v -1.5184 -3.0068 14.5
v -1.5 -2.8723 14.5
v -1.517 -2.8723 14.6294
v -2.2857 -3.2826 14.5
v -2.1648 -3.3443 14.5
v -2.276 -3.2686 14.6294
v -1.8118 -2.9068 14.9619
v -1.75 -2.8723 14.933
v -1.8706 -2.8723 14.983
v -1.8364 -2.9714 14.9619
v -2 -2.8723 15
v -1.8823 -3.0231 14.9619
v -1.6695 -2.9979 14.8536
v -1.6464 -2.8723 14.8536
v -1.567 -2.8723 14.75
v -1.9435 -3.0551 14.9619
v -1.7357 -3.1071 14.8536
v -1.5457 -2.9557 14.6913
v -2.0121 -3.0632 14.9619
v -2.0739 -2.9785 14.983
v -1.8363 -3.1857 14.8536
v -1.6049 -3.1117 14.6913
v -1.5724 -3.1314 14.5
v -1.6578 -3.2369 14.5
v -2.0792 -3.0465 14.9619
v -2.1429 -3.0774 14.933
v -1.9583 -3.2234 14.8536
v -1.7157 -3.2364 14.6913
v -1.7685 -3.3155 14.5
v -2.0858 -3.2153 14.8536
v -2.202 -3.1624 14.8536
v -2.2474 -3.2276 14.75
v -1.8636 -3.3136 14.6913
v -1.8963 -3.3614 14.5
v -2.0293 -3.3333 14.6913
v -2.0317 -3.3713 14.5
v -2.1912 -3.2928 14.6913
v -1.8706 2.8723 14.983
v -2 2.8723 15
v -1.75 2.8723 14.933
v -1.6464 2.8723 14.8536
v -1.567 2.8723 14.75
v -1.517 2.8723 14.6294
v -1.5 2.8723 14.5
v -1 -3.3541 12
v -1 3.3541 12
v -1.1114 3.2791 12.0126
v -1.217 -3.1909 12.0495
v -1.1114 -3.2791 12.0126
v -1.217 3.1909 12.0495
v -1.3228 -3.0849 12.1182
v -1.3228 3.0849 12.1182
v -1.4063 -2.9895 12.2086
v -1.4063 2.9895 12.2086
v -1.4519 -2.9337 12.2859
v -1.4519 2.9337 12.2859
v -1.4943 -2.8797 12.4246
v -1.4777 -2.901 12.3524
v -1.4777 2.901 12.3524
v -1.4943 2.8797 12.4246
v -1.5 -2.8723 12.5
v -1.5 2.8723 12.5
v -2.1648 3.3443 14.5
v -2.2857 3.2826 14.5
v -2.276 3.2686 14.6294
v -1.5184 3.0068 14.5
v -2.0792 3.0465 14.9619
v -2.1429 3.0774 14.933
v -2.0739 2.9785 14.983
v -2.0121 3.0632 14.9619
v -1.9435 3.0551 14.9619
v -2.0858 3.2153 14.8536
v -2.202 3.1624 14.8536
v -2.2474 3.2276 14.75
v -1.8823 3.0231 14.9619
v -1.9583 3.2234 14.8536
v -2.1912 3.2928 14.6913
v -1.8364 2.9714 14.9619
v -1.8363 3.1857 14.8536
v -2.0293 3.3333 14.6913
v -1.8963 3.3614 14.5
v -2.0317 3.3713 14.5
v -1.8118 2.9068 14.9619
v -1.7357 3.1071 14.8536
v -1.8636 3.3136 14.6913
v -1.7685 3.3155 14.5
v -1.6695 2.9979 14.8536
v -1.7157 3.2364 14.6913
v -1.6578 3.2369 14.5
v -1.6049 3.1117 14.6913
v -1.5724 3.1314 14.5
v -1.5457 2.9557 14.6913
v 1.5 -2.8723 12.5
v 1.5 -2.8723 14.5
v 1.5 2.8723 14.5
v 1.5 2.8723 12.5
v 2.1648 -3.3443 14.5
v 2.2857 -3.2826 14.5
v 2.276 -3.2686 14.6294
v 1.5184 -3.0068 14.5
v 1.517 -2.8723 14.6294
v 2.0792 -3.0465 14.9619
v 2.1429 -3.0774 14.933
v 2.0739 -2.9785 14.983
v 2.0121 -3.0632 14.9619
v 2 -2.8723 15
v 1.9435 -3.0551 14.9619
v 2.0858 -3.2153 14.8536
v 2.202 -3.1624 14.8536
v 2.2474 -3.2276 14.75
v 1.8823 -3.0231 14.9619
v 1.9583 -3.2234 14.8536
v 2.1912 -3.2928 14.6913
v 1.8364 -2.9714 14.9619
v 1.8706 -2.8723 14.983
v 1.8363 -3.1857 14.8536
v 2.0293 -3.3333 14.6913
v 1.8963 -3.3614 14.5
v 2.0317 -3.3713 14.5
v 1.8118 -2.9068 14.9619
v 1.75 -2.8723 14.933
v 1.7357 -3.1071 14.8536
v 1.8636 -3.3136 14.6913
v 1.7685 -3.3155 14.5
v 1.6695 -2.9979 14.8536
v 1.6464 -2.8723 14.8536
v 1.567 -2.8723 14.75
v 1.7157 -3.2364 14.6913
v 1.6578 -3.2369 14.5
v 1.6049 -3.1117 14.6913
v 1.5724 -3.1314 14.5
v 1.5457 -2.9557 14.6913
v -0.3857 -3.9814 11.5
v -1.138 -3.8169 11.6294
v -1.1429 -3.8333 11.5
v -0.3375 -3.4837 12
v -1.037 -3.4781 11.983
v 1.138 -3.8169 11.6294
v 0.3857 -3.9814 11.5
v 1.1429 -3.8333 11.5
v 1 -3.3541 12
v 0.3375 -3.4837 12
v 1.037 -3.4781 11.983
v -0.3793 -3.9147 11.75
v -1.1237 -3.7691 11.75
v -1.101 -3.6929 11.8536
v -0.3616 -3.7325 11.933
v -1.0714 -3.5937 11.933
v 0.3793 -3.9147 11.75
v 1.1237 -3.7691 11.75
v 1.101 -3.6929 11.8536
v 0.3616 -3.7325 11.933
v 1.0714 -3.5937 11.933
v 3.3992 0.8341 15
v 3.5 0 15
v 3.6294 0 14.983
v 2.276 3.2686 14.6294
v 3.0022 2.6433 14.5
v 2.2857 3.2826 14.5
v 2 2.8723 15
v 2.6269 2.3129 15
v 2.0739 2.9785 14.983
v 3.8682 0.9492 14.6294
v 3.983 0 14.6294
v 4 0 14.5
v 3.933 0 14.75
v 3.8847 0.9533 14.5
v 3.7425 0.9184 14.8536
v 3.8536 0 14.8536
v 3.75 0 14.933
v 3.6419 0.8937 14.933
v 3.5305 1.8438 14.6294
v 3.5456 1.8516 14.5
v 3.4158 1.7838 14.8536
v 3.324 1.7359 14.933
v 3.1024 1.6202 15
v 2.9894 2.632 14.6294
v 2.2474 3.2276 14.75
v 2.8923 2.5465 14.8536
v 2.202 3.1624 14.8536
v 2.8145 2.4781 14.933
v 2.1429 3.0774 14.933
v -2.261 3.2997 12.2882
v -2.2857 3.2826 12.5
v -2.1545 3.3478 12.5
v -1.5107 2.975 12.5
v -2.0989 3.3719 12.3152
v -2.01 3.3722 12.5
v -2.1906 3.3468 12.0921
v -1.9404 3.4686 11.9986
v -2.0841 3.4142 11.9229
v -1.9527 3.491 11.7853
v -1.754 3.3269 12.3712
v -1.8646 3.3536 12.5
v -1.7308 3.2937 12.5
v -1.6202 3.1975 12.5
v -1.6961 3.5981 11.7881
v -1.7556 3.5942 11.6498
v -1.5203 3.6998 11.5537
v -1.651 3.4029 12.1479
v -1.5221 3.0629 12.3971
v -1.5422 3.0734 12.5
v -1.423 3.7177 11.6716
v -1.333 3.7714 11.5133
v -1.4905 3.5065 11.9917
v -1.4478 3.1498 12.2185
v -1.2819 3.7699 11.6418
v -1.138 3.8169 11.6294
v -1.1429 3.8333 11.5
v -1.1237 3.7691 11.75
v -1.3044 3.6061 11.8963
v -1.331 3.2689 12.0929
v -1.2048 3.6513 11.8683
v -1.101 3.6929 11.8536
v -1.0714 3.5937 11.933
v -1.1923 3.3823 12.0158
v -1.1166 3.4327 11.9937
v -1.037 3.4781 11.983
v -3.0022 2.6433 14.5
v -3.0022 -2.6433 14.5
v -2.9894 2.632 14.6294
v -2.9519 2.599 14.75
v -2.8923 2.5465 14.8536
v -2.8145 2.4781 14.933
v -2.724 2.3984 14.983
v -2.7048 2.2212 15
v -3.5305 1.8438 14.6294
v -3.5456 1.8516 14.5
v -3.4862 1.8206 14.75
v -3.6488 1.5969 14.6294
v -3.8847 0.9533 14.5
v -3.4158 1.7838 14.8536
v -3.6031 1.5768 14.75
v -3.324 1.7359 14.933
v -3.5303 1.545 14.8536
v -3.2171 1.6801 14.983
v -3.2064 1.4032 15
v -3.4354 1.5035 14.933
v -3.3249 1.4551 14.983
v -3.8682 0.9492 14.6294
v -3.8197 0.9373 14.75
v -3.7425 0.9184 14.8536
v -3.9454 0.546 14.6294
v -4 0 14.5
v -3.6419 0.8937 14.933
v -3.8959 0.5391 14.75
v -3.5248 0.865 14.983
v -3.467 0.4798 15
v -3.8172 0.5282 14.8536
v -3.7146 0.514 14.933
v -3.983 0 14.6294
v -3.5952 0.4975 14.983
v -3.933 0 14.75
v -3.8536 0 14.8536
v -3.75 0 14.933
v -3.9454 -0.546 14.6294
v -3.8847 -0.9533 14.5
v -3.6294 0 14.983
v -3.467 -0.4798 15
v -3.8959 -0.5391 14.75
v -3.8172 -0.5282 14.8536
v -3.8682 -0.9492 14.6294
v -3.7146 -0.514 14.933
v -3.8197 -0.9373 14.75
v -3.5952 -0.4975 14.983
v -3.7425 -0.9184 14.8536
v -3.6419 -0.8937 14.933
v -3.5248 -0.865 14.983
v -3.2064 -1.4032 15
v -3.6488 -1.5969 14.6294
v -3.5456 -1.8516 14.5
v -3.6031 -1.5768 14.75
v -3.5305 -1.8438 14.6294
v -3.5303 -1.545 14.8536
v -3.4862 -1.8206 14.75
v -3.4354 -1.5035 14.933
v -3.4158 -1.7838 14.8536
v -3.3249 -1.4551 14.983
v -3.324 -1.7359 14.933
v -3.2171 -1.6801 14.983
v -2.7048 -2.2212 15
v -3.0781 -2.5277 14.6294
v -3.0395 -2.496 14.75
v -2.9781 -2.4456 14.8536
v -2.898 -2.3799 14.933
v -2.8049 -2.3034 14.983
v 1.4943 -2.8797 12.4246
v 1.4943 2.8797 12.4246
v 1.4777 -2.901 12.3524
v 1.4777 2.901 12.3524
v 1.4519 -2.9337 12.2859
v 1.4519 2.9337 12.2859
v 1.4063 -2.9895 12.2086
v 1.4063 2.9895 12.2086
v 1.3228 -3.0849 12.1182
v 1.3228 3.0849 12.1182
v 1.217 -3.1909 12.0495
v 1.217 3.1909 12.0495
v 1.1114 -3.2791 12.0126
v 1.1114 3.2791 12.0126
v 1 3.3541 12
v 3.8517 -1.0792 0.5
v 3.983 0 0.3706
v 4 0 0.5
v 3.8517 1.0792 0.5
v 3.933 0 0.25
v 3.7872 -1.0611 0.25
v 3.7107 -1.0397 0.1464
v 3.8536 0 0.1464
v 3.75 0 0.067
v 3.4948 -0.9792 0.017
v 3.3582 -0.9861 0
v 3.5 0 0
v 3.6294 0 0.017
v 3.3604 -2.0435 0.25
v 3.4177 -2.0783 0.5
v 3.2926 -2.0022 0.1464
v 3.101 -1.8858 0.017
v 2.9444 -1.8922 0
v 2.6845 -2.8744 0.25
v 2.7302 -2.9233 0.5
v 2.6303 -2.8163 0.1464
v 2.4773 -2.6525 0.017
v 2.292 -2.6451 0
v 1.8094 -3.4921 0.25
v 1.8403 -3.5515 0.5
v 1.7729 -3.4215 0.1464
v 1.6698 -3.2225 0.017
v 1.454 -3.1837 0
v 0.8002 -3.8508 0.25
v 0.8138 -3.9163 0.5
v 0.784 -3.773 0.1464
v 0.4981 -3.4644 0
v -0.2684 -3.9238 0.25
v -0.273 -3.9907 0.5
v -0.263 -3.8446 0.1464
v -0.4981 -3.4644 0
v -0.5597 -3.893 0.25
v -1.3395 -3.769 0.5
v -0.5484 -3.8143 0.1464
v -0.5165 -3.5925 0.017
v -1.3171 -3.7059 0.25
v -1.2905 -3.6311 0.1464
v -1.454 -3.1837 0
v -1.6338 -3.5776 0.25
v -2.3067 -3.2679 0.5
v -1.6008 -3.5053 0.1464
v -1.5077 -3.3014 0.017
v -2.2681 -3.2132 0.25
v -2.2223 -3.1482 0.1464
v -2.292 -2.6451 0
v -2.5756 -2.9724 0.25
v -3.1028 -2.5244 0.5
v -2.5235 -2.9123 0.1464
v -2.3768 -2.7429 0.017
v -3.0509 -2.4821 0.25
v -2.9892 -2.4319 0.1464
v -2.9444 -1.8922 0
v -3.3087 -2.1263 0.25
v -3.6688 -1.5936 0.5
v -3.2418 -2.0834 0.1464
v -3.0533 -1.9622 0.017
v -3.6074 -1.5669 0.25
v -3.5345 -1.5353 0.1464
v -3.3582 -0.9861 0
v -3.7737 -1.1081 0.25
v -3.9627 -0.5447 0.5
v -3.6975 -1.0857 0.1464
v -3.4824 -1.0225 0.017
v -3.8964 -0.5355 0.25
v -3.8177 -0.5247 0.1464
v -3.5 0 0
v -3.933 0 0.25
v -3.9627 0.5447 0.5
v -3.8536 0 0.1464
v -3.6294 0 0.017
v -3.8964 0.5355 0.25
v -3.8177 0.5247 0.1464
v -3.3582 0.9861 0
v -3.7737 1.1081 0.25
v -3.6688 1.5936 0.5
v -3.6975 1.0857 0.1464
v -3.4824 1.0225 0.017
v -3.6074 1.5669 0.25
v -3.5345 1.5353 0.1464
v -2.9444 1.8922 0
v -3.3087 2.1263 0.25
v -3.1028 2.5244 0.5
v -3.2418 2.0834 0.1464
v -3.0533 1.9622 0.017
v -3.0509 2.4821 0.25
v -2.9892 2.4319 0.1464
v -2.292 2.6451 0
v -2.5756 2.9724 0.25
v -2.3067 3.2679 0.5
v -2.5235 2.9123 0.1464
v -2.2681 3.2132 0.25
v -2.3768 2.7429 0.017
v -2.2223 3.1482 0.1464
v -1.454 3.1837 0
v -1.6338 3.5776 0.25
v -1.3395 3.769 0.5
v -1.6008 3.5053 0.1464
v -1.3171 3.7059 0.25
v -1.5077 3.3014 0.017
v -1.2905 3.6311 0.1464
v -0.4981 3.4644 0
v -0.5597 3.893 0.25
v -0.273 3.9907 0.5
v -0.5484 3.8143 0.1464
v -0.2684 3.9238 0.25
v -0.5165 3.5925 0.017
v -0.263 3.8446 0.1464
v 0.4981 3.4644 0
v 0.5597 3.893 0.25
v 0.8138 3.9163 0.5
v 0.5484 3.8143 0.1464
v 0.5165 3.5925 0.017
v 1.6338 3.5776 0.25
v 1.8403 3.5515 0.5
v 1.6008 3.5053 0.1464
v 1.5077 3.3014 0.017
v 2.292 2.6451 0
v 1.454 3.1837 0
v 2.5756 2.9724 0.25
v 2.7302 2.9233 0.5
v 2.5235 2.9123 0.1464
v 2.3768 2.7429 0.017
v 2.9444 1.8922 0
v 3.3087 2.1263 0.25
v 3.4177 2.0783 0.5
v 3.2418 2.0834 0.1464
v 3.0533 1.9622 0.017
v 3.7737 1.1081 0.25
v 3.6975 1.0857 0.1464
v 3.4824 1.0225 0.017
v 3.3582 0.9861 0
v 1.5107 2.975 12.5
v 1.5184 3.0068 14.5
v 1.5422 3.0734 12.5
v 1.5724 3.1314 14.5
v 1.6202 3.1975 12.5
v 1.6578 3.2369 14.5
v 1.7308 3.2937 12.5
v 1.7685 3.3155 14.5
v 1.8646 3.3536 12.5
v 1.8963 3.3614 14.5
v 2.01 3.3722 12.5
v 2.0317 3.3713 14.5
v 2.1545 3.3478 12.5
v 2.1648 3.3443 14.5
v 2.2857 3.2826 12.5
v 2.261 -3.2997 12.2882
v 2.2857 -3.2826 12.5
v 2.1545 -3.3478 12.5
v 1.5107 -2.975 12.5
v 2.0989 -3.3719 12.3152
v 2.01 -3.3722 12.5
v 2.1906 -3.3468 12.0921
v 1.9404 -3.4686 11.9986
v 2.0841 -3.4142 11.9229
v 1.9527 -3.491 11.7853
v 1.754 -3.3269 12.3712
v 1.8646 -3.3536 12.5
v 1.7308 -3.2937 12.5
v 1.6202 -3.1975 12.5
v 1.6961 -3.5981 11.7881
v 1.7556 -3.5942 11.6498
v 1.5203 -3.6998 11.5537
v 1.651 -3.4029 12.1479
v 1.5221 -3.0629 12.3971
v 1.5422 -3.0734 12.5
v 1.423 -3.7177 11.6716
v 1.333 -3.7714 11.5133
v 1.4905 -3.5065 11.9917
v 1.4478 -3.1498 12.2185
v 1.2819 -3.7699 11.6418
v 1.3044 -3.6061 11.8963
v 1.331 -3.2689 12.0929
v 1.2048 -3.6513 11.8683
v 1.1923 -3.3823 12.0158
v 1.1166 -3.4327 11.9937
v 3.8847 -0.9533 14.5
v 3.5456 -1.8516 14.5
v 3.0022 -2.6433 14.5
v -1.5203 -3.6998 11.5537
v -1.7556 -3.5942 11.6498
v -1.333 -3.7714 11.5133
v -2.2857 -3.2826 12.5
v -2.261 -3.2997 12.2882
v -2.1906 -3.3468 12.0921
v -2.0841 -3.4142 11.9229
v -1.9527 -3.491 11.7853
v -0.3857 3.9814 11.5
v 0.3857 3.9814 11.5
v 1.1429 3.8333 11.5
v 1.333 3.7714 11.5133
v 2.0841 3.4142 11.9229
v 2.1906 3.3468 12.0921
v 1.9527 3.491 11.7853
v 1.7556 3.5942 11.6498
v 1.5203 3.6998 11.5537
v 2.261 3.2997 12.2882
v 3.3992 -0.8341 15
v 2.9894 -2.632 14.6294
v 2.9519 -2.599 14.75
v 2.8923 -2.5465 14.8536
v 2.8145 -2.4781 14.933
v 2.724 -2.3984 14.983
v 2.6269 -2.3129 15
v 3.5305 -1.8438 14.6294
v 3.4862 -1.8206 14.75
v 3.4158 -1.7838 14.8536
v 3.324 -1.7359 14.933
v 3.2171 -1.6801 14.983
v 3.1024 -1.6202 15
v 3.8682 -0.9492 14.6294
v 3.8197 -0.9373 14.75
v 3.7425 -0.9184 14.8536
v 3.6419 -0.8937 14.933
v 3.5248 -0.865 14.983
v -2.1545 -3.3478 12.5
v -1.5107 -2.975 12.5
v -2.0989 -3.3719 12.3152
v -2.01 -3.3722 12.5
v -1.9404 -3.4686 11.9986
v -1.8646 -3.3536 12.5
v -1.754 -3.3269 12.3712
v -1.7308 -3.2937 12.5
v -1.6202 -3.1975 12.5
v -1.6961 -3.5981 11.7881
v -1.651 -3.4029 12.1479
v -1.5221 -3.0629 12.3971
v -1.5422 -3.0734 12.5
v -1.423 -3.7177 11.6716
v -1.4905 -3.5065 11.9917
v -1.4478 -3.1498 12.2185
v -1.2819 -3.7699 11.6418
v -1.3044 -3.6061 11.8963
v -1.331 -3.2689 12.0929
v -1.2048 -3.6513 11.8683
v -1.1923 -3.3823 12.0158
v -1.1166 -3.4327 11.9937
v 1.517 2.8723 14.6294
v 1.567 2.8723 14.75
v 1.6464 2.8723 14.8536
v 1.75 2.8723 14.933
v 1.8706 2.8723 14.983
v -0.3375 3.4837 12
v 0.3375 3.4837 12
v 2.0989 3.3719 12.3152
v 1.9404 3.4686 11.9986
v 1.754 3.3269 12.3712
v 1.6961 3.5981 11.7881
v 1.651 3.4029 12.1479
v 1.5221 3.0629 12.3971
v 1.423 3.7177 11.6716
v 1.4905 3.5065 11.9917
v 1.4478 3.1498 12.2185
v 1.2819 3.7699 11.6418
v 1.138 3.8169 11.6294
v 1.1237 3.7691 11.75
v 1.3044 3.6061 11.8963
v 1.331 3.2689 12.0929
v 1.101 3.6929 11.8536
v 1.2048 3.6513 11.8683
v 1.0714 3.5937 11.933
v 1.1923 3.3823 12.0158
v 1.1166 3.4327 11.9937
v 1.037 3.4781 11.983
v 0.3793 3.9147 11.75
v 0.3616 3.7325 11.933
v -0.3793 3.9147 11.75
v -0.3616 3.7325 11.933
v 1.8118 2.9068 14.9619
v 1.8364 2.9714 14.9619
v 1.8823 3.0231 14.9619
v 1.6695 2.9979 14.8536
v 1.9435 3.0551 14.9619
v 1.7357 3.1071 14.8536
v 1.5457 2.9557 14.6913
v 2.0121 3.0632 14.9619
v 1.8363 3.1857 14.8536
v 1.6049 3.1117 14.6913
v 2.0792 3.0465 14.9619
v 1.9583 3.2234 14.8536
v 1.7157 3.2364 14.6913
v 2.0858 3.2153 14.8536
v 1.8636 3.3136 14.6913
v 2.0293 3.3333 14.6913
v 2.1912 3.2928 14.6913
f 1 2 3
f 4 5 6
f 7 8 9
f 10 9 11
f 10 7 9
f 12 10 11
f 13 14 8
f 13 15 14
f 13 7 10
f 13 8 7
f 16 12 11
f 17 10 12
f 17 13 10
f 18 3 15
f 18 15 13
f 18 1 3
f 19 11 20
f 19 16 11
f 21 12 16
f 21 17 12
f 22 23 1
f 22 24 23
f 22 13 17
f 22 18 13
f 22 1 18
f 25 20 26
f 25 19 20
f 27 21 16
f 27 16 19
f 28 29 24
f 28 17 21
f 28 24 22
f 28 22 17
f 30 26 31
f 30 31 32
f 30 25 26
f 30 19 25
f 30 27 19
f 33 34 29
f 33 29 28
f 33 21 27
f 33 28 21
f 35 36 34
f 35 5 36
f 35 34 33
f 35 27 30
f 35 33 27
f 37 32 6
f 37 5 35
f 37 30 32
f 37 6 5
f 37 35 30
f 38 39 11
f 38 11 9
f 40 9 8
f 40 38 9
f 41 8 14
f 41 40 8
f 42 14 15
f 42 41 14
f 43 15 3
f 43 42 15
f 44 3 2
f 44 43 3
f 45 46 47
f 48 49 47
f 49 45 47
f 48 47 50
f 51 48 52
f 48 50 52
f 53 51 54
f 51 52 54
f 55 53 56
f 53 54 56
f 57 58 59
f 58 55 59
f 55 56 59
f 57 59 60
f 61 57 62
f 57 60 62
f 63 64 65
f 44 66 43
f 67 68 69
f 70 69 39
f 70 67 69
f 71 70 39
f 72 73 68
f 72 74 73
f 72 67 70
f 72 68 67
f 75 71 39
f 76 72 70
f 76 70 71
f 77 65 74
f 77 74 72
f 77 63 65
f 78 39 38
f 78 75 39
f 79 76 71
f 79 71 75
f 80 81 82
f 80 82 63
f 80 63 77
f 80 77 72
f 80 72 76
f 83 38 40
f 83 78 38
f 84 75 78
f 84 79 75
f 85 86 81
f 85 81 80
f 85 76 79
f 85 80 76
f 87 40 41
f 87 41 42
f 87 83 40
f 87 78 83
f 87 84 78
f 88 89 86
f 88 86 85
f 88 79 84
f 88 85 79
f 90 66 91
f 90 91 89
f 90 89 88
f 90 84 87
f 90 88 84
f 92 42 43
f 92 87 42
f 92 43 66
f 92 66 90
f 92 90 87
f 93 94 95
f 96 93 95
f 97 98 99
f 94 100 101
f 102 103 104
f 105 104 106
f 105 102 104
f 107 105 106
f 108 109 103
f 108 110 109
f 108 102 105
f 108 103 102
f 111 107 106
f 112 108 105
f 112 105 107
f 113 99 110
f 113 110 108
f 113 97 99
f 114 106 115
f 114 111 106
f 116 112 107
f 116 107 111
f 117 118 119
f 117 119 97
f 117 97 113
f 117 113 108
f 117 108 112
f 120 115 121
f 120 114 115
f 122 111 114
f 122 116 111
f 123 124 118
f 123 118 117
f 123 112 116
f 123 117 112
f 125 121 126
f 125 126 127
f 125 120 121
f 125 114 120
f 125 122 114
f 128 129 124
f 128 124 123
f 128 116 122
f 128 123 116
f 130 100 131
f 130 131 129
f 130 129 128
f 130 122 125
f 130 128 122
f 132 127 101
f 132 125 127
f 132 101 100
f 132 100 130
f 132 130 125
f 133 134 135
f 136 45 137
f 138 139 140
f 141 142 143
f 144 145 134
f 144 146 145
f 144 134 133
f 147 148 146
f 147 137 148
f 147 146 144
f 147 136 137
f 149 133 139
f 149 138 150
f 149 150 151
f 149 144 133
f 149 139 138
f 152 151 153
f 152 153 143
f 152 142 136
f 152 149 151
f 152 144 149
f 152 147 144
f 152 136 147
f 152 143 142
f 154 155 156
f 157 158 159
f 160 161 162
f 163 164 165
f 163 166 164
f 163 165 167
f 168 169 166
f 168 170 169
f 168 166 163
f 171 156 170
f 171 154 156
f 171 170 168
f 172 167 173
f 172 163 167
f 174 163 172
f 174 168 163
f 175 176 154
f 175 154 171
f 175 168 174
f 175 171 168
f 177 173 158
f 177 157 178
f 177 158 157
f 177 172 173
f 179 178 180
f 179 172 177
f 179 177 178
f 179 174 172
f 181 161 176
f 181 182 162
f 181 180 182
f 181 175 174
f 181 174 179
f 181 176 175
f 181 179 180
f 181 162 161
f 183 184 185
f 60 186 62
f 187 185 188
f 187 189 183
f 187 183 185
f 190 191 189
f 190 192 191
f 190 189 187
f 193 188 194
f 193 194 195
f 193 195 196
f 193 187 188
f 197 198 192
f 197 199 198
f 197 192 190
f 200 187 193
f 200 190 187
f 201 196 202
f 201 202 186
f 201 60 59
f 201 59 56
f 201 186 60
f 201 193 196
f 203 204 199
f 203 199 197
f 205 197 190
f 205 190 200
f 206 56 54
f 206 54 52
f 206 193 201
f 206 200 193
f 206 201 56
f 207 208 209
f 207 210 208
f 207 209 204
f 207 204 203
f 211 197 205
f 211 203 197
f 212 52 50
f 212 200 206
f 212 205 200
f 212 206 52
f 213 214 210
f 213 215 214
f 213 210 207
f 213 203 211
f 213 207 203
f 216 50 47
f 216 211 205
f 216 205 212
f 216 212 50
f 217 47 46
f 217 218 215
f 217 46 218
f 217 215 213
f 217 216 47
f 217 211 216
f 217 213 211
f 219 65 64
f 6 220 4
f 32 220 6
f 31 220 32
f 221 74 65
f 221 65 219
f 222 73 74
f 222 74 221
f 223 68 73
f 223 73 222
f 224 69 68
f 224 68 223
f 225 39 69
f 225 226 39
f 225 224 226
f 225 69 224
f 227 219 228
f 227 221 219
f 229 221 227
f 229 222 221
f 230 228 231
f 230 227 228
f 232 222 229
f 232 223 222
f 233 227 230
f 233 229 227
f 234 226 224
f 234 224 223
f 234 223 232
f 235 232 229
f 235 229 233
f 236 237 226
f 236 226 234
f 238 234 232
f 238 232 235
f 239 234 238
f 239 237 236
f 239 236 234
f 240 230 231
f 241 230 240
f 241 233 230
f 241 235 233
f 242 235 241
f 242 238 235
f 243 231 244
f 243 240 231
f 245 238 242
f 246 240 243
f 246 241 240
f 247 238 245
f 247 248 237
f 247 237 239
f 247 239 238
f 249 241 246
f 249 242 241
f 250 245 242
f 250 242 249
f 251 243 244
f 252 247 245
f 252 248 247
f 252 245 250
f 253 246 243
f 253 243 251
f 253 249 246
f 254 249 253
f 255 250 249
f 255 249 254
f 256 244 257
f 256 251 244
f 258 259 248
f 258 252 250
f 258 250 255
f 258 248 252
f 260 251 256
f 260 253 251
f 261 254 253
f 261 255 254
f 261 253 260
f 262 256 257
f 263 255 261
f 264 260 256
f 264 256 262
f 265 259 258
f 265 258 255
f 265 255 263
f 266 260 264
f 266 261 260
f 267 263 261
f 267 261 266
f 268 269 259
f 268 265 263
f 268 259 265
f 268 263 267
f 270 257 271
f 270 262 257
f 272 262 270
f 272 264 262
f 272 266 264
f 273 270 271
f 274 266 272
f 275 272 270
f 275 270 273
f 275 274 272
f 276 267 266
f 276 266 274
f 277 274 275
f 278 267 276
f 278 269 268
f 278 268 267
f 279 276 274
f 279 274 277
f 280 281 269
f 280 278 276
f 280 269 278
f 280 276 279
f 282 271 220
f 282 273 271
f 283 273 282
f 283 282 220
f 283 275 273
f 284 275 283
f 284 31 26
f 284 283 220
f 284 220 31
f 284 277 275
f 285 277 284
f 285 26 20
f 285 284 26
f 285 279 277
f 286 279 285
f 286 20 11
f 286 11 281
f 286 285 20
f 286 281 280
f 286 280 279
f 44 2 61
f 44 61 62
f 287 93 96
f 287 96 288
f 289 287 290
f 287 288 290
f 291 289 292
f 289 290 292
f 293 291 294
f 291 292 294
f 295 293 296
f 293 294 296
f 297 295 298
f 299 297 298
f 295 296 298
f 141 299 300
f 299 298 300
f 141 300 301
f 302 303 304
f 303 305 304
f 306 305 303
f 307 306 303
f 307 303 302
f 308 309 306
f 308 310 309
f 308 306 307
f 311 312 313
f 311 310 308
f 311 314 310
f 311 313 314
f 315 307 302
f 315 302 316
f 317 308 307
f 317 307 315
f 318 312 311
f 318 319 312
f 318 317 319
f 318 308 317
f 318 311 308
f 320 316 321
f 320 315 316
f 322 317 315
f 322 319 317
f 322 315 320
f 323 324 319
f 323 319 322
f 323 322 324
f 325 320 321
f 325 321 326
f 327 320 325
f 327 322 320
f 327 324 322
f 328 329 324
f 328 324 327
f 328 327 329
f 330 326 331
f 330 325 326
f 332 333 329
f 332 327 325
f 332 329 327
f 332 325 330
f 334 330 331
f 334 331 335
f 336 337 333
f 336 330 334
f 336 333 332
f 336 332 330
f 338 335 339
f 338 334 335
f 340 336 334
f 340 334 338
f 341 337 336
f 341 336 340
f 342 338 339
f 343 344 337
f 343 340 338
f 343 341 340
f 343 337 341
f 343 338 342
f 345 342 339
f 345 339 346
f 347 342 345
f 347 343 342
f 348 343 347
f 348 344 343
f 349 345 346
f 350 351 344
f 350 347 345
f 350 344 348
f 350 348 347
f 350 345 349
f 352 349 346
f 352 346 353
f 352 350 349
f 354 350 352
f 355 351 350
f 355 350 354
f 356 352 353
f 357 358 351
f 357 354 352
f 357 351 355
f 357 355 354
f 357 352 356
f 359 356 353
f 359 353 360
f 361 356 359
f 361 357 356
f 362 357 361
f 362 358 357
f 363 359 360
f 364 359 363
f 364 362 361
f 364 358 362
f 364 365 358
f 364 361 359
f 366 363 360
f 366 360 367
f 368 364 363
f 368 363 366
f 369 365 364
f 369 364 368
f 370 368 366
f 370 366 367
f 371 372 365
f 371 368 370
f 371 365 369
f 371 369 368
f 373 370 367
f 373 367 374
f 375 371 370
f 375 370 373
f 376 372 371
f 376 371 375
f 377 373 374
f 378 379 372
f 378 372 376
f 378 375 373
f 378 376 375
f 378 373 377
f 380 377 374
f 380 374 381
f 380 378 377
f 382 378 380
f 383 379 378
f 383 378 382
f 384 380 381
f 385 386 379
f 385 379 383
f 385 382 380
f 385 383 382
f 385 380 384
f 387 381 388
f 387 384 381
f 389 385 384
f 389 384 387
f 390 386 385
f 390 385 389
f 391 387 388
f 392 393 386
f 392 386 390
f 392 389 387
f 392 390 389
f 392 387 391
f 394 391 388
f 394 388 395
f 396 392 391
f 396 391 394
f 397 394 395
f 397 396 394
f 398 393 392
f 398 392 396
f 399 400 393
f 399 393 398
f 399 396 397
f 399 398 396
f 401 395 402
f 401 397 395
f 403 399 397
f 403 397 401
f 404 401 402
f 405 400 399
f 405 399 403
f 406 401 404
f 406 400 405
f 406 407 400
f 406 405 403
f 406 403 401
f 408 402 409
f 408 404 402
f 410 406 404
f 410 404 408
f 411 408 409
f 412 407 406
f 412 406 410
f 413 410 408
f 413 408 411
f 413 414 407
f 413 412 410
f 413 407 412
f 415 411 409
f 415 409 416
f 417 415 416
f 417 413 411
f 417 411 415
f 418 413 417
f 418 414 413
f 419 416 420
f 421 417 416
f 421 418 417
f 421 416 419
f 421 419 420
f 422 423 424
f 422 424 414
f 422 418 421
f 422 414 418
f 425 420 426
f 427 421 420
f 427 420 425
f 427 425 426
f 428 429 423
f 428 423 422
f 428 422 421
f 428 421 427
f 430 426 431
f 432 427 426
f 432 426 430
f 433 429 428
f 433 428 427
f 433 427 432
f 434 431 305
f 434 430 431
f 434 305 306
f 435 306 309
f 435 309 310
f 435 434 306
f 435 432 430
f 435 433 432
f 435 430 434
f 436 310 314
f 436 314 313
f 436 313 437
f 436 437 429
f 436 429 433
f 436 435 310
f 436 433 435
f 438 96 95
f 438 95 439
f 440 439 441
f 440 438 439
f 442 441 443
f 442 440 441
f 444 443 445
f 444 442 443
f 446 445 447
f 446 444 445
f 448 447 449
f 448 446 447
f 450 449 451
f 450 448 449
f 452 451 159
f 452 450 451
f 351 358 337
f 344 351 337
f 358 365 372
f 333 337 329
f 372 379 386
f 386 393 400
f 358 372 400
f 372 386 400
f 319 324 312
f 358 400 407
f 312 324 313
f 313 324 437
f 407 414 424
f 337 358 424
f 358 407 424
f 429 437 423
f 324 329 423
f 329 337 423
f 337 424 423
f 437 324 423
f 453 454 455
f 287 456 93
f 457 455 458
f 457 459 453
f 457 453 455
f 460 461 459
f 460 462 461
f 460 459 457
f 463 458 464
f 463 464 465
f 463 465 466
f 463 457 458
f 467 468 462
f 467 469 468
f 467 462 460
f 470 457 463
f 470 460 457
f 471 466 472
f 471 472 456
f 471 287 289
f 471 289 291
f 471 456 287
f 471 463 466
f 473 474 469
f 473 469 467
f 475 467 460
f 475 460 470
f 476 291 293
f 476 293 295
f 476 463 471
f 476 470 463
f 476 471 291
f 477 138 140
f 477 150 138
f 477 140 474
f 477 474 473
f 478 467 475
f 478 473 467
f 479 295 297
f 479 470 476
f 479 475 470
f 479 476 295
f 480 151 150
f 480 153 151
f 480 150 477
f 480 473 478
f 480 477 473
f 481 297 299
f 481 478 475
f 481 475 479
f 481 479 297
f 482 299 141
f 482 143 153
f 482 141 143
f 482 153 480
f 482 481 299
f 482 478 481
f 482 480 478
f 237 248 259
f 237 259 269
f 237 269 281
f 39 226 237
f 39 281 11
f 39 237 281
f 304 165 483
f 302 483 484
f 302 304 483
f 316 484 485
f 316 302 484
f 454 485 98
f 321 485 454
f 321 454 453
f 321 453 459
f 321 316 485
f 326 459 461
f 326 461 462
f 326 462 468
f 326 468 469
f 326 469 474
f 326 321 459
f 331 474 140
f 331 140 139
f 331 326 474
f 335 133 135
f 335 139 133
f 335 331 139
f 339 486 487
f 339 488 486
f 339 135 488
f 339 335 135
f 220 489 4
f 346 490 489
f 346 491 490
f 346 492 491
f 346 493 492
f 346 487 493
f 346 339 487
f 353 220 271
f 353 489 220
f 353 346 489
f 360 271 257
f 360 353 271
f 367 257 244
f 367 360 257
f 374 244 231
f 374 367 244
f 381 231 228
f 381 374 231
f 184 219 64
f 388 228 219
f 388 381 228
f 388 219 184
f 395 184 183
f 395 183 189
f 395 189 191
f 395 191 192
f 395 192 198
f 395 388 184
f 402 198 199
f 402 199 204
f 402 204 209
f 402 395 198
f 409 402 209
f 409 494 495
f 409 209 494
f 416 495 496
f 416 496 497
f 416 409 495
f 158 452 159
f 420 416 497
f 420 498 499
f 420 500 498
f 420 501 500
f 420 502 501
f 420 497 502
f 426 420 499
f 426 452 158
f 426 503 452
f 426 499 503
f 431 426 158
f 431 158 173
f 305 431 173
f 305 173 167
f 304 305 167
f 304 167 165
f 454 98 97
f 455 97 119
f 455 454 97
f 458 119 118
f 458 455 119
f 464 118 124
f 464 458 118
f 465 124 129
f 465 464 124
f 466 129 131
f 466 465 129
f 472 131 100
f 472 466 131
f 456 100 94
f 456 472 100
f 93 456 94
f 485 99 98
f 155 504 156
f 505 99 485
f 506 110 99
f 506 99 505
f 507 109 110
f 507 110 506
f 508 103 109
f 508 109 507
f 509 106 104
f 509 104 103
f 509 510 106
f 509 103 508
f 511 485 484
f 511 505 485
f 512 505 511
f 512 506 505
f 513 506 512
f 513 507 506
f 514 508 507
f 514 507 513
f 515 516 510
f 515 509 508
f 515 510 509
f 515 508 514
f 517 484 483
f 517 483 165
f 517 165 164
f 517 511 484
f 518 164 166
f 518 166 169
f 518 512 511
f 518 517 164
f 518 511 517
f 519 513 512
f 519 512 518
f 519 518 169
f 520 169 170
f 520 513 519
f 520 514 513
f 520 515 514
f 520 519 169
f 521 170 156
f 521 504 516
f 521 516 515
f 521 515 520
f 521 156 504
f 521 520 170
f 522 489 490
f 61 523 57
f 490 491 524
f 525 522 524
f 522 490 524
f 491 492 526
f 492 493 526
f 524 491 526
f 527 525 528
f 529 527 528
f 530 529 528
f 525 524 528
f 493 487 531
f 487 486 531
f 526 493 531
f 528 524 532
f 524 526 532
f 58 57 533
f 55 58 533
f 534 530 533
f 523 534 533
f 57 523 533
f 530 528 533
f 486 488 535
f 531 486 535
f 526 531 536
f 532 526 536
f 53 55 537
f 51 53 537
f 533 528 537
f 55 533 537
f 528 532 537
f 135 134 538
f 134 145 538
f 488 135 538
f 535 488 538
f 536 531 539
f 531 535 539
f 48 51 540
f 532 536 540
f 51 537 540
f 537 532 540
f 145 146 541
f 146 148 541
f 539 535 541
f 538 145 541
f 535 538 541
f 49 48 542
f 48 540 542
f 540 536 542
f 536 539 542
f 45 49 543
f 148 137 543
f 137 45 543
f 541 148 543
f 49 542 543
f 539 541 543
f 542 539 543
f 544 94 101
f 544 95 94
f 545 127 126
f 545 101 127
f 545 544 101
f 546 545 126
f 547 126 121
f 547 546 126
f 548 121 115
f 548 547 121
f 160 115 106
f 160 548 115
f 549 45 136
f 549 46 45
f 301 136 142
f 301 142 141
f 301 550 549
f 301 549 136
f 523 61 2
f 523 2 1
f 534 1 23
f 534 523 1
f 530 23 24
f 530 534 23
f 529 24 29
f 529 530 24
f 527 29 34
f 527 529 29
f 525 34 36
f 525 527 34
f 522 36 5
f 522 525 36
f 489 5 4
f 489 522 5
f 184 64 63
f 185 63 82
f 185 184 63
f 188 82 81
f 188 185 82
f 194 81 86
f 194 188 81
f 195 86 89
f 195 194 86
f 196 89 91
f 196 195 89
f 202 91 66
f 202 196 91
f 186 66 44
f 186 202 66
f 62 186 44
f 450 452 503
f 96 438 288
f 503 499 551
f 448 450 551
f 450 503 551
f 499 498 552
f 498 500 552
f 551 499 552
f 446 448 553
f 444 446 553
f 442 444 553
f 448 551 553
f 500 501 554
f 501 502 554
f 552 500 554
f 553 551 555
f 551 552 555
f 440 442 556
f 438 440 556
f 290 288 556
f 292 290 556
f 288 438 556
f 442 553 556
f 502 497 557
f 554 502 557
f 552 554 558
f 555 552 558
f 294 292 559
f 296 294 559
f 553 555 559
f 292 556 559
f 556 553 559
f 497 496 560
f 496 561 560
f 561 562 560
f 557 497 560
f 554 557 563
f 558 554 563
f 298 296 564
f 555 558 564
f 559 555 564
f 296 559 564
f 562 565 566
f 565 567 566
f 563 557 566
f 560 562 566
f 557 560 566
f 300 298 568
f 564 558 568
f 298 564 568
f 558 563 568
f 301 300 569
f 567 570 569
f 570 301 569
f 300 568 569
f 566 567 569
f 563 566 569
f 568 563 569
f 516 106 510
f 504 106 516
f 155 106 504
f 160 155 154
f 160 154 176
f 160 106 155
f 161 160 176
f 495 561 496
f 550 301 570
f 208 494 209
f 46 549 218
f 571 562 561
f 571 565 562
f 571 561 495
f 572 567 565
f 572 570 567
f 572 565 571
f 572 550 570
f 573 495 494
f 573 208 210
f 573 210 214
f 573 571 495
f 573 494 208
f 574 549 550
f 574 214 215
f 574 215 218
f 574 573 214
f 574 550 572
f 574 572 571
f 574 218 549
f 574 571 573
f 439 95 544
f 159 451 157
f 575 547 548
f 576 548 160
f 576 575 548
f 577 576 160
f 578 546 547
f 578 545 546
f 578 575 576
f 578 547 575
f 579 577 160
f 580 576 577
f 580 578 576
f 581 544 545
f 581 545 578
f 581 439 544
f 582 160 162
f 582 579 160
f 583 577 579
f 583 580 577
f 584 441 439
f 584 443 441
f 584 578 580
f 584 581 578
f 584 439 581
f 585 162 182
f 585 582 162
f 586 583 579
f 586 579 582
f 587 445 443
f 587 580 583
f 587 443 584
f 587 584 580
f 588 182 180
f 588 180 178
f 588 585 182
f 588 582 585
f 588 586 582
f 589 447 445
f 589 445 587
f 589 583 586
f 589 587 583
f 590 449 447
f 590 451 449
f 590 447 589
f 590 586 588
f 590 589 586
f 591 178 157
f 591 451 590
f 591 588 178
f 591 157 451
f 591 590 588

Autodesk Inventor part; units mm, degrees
ref_plane "YZ Plane" through (0, 0, 0) normal (1, 0, 0) x (0, 1, 0)
ref_plane "XZ Plane" through (0, 0, 0) normal (0, 1, 0) x (-1, 0, 0)
ref_plane "XY Plane" through (0, 0, 0) normal (0, 0, 1) x (1, 0, 0)
sketch "Sketch1" plane through (0, 0, 0) normal (0, 0, 1) x (1, 0, 0)
  circle A0 centre (0, 0) radius 4
  dimension "d0" = 8
extrude "Extrusion1" add sketch "Sketch1" along normal blind 15
sketch "Sketch2" plane through (0, 0, 15) normal (0, 0, 1) x (1, 0, 0)
  circle A0 centre (0, 0) radius 4 projected
  line L0 (0, -5.6) -> (0, 5.6) projected
  line L1 (1.5, -3.7081) -> (1.5, 3.7081)
  line L2 (-1.5, -3.7081) -> (-1.5, 3.7081)
  circle A1 centre (0, 0) radius 4 projected
  dimension "d5" = 3
  dimension "d6" = 1.5
extrude "Extrusion2" cut sketch "Sketch2" against normal blind 3 contours L1 A0 L0 | L0 A0 L2
fillet "Fillet1" radius 0.5 14 edges at (-1.5, 0, 15) (1.5, 0, 15) (-1.5, 0, 12) (1.5, 0, 12) (3.3166, -2.2361, 15) (3.3166, 2.2361, 15) (-4, 0, 15) (-1.5, -3.7081, 13.5) (-1.5, 3.7081, 13.5) (1.5, -3.7081, 13.5) (1.5, 3.7081, 13.5) (0, -4, 12) (0, 4, 12) (-4, 0, 0)
properties part number "Locating Pin"
